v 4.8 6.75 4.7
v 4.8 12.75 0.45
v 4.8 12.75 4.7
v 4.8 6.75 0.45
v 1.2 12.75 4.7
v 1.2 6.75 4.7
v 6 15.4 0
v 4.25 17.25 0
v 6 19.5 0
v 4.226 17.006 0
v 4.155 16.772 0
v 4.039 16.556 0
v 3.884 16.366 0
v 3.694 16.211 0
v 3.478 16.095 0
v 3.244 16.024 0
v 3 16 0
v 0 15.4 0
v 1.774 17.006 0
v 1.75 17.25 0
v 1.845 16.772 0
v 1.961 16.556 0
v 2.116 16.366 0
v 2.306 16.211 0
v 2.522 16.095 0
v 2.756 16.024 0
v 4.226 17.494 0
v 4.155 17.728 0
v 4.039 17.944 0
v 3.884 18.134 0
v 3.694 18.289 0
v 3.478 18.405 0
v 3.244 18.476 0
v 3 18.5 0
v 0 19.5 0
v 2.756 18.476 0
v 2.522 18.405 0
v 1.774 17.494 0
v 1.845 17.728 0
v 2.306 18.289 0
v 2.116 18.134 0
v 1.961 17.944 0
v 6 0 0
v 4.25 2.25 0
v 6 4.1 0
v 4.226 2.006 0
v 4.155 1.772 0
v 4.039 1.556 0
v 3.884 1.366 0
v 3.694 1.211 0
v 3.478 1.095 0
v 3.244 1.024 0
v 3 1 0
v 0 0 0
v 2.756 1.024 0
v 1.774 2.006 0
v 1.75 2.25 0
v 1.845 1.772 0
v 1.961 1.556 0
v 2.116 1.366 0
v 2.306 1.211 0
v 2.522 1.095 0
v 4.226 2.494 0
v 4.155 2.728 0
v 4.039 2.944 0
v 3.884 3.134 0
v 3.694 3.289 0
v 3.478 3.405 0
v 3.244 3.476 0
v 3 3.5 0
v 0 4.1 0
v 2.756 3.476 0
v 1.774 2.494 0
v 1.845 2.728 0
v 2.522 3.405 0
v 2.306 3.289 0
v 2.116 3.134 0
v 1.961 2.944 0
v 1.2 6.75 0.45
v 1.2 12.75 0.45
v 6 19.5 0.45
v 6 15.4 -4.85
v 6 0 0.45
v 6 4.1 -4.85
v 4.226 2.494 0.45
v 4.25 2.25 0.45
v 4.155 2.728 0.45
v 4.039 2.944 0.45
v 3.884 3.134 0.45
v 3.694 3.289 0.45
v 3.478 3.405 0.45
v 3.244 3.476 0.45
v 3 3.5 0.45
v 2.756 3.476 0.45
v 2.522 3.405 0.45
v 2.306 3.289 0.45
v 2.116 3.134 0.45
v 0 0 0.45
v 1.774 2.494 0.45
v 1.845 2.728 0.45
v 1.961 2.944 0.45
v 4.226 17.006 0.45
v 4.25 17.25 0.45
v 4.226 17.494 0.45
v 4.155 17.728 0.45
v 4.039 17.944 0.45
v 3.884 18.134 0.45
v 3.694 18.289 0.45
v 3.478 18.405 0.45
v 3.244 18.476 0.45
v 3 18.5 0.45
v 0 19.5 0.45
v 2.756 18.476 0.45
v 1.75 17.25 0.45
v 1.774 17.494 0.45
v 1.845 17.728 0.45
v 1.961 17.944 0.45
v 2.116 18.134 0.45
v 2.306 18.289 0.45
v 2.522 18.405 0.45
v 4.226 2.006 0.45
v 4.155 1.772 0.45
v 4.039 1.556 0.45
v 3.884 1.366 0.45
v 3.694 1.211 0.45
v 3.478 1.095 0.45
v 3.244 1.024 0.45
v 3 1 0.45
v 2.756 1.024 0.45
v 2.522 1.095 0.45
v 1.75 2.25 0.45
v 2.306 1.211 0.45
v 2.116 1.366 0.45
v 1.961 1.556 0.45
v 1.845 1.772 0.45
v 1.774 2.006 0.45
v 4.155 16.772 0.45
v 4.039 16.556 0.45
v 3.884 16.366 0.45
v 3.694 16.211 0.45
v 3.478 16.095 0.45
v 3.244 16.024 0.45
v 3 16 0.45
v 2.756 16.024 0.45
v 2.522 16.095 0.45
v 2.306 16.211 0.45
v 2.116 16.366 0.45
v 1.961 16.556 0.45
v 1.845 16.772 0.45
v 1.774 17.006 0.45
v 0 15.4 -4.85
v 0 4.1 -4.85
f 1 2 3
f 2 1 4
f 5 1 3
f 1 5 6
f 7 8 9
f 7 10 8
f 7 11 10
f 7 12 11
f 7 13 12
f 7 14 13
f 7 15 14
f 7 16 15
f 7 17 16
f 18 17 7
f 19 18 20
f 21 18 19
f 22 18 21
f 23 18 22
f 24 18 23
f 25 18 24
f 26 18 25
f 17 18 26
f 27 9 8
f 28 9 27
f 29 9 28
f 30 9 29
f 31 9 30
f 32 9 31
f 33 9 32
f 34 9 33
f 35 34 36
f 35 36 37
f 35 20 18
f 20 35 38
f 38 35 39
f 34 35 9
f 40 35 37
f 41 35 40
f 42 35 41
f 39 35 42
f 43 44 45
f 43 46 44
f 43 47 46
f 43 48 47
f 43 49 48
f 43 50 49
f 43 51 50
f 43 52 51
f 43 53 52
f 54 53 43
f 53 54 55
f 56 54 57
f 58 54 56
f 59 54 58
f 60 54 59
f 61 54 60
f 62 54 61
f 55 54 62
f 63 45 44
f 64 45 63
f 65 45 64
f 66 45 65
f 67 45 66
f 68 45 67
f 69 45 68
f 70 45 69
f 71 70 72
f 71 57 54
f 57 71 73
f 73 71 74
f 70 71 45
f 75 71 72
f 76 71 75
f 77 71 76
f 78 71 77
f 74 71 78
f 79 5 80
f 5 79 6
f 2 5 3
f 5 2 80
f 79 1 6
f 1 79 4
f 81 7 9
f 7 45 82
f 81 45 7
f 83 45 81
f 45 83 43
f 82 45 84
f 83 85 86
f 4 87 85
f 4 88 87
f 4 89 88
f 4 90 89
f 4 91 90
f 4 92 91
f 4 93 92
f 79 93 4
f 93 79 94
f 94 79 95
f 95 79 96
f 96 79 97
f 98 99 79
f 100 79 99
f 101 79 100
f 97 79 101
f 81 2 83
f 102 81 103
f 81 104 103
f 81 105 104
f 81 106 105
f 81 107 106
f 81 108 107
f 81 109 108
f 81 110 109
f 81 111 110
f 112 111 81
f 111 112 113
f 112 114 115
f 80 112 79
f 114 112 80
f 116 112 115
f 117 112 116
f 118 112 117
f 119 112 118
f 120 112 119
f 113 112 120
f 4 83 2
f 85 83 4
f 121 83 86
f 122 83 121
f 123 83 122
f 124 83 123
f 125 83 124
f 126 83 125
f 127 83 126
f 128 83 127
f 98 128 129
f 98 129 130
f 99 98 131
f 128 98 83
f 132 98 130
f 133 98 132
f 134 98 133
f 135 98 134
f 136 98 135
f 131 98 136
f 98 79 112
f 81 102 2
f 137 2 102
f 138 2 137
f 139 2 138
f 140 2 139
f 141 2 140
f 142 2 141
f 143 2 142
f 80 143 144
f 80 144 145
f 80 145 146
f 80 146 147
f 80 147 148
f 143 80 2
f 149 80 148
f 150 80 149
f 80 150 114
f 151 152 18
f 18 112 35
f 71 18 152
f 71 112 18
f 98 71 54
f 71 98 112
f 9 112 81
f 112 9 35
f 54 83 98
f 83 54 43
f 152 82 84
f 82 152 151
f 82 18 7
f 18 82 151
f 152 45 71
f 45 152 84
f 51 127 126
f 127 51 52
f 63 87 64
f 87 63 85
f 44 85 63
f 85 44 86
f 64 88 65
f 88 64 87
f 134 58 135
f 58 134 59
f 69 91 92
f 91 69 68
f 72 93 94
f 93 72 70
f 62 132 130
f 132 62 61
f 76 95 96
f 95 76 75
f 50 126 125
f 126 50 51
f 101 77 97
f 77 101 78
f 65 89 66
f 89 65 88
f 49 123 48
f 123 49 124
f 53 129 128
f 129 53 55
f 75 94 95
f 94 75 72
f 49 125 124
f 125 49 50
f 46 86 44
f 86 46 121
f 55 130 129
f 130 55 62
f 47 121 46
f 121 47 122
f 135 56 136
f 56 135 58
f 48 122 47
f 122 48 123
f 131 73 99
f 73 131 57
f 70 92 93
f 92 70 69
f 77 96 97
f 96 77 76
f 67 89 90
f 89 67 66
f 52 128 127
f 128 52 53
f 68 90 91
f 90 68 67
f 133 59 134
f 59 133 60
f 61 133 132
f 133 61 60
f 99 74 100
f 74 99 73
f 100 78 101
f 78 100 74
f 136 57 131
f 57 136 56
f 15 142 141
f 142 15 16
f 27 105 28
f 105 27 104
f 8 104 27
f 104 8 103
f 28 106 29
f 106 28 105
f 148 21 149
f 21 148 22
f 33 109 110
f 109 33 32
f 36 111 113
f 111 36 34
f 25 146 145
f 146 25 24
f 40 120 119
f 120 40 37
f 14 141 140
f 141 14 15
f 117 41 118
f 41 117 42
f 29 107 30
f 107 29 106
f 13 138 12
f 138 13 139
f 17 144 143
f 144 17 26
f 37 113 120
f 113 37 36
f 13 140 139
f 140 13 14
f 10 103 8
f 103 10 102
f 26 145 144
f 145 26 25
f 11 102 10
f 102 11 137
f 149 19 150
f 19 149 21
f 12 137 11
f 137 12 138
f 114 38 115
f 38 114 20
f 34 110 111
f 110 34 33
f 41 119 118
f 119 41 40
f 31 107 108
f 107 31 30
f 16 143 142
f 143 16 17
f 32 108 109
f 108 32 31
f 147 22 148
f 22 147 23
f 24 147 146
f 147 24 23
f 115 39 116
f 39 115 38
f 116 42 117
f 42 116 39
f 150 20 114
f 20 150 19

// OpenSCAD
// file: switch_vars.scad
switch_plate_x =  6;
switch_plate_y = 19.5;
switch_plate_z =  0.45;

switch_base_x =  6;
switch_base_y = 11.3;
switch_base_z =  5.3 - switch_plate_z;

switch_hole_d   = 2.5;
switch_hole_off = 1;

switch_handle_x =  3.6;
switch_handle_y =  6;
switch_handle_z = 10 - switch_plate_z - switch_base_z;
// main file
include <switch_vars.scad>;

module switch_holes()
{
    h = switch_plate_z + switch_base_z + switch_handle_z;
    off_x = switch_plate_x / 2;
    off_y = switch_hole_d/2 + switch_hole_off;
    translate([off_x, 0, -h/2]) {
        translate([0, off_y])
            cylinder(d = switch_hole_d, h = h, $fn=32);
        translate([0, switch_plate_y - off_y])
            cylinder(d = switch_hole_d, h = h, $fn=32);
    }
}

module _switch()
{
    // Handle
    h_off_x = (switch_plate_x - switch_handle_x) / 2;
    h_off_y = (switch_plate_y - switch_handle_y) / 2;
    translate([h_off_x, h_off_y, 0]) {
        color("Green")
            cube([switch_handle_x, switch_handle_y, switch_handle_z]);
    }
    // Plate
    cube([switch_plate_x, switch_plate_y, switch_plate_z]);

    // Base
    b_off_y = (switch_plate_y - switch_base_y) / 2;
    translate([0, b_off_y, -switch_base_z]) {
        color("DarkSlateGray")
            cube([switch_base_x, switch_base_y, switch_base_z]);
    }
}

module switch(part = "positive")
{
    if (part == "negative") {
        switch_holes();
    } else {
        difference() {
            _switch();
            switch_holes();
        }
    }
}

switch();
